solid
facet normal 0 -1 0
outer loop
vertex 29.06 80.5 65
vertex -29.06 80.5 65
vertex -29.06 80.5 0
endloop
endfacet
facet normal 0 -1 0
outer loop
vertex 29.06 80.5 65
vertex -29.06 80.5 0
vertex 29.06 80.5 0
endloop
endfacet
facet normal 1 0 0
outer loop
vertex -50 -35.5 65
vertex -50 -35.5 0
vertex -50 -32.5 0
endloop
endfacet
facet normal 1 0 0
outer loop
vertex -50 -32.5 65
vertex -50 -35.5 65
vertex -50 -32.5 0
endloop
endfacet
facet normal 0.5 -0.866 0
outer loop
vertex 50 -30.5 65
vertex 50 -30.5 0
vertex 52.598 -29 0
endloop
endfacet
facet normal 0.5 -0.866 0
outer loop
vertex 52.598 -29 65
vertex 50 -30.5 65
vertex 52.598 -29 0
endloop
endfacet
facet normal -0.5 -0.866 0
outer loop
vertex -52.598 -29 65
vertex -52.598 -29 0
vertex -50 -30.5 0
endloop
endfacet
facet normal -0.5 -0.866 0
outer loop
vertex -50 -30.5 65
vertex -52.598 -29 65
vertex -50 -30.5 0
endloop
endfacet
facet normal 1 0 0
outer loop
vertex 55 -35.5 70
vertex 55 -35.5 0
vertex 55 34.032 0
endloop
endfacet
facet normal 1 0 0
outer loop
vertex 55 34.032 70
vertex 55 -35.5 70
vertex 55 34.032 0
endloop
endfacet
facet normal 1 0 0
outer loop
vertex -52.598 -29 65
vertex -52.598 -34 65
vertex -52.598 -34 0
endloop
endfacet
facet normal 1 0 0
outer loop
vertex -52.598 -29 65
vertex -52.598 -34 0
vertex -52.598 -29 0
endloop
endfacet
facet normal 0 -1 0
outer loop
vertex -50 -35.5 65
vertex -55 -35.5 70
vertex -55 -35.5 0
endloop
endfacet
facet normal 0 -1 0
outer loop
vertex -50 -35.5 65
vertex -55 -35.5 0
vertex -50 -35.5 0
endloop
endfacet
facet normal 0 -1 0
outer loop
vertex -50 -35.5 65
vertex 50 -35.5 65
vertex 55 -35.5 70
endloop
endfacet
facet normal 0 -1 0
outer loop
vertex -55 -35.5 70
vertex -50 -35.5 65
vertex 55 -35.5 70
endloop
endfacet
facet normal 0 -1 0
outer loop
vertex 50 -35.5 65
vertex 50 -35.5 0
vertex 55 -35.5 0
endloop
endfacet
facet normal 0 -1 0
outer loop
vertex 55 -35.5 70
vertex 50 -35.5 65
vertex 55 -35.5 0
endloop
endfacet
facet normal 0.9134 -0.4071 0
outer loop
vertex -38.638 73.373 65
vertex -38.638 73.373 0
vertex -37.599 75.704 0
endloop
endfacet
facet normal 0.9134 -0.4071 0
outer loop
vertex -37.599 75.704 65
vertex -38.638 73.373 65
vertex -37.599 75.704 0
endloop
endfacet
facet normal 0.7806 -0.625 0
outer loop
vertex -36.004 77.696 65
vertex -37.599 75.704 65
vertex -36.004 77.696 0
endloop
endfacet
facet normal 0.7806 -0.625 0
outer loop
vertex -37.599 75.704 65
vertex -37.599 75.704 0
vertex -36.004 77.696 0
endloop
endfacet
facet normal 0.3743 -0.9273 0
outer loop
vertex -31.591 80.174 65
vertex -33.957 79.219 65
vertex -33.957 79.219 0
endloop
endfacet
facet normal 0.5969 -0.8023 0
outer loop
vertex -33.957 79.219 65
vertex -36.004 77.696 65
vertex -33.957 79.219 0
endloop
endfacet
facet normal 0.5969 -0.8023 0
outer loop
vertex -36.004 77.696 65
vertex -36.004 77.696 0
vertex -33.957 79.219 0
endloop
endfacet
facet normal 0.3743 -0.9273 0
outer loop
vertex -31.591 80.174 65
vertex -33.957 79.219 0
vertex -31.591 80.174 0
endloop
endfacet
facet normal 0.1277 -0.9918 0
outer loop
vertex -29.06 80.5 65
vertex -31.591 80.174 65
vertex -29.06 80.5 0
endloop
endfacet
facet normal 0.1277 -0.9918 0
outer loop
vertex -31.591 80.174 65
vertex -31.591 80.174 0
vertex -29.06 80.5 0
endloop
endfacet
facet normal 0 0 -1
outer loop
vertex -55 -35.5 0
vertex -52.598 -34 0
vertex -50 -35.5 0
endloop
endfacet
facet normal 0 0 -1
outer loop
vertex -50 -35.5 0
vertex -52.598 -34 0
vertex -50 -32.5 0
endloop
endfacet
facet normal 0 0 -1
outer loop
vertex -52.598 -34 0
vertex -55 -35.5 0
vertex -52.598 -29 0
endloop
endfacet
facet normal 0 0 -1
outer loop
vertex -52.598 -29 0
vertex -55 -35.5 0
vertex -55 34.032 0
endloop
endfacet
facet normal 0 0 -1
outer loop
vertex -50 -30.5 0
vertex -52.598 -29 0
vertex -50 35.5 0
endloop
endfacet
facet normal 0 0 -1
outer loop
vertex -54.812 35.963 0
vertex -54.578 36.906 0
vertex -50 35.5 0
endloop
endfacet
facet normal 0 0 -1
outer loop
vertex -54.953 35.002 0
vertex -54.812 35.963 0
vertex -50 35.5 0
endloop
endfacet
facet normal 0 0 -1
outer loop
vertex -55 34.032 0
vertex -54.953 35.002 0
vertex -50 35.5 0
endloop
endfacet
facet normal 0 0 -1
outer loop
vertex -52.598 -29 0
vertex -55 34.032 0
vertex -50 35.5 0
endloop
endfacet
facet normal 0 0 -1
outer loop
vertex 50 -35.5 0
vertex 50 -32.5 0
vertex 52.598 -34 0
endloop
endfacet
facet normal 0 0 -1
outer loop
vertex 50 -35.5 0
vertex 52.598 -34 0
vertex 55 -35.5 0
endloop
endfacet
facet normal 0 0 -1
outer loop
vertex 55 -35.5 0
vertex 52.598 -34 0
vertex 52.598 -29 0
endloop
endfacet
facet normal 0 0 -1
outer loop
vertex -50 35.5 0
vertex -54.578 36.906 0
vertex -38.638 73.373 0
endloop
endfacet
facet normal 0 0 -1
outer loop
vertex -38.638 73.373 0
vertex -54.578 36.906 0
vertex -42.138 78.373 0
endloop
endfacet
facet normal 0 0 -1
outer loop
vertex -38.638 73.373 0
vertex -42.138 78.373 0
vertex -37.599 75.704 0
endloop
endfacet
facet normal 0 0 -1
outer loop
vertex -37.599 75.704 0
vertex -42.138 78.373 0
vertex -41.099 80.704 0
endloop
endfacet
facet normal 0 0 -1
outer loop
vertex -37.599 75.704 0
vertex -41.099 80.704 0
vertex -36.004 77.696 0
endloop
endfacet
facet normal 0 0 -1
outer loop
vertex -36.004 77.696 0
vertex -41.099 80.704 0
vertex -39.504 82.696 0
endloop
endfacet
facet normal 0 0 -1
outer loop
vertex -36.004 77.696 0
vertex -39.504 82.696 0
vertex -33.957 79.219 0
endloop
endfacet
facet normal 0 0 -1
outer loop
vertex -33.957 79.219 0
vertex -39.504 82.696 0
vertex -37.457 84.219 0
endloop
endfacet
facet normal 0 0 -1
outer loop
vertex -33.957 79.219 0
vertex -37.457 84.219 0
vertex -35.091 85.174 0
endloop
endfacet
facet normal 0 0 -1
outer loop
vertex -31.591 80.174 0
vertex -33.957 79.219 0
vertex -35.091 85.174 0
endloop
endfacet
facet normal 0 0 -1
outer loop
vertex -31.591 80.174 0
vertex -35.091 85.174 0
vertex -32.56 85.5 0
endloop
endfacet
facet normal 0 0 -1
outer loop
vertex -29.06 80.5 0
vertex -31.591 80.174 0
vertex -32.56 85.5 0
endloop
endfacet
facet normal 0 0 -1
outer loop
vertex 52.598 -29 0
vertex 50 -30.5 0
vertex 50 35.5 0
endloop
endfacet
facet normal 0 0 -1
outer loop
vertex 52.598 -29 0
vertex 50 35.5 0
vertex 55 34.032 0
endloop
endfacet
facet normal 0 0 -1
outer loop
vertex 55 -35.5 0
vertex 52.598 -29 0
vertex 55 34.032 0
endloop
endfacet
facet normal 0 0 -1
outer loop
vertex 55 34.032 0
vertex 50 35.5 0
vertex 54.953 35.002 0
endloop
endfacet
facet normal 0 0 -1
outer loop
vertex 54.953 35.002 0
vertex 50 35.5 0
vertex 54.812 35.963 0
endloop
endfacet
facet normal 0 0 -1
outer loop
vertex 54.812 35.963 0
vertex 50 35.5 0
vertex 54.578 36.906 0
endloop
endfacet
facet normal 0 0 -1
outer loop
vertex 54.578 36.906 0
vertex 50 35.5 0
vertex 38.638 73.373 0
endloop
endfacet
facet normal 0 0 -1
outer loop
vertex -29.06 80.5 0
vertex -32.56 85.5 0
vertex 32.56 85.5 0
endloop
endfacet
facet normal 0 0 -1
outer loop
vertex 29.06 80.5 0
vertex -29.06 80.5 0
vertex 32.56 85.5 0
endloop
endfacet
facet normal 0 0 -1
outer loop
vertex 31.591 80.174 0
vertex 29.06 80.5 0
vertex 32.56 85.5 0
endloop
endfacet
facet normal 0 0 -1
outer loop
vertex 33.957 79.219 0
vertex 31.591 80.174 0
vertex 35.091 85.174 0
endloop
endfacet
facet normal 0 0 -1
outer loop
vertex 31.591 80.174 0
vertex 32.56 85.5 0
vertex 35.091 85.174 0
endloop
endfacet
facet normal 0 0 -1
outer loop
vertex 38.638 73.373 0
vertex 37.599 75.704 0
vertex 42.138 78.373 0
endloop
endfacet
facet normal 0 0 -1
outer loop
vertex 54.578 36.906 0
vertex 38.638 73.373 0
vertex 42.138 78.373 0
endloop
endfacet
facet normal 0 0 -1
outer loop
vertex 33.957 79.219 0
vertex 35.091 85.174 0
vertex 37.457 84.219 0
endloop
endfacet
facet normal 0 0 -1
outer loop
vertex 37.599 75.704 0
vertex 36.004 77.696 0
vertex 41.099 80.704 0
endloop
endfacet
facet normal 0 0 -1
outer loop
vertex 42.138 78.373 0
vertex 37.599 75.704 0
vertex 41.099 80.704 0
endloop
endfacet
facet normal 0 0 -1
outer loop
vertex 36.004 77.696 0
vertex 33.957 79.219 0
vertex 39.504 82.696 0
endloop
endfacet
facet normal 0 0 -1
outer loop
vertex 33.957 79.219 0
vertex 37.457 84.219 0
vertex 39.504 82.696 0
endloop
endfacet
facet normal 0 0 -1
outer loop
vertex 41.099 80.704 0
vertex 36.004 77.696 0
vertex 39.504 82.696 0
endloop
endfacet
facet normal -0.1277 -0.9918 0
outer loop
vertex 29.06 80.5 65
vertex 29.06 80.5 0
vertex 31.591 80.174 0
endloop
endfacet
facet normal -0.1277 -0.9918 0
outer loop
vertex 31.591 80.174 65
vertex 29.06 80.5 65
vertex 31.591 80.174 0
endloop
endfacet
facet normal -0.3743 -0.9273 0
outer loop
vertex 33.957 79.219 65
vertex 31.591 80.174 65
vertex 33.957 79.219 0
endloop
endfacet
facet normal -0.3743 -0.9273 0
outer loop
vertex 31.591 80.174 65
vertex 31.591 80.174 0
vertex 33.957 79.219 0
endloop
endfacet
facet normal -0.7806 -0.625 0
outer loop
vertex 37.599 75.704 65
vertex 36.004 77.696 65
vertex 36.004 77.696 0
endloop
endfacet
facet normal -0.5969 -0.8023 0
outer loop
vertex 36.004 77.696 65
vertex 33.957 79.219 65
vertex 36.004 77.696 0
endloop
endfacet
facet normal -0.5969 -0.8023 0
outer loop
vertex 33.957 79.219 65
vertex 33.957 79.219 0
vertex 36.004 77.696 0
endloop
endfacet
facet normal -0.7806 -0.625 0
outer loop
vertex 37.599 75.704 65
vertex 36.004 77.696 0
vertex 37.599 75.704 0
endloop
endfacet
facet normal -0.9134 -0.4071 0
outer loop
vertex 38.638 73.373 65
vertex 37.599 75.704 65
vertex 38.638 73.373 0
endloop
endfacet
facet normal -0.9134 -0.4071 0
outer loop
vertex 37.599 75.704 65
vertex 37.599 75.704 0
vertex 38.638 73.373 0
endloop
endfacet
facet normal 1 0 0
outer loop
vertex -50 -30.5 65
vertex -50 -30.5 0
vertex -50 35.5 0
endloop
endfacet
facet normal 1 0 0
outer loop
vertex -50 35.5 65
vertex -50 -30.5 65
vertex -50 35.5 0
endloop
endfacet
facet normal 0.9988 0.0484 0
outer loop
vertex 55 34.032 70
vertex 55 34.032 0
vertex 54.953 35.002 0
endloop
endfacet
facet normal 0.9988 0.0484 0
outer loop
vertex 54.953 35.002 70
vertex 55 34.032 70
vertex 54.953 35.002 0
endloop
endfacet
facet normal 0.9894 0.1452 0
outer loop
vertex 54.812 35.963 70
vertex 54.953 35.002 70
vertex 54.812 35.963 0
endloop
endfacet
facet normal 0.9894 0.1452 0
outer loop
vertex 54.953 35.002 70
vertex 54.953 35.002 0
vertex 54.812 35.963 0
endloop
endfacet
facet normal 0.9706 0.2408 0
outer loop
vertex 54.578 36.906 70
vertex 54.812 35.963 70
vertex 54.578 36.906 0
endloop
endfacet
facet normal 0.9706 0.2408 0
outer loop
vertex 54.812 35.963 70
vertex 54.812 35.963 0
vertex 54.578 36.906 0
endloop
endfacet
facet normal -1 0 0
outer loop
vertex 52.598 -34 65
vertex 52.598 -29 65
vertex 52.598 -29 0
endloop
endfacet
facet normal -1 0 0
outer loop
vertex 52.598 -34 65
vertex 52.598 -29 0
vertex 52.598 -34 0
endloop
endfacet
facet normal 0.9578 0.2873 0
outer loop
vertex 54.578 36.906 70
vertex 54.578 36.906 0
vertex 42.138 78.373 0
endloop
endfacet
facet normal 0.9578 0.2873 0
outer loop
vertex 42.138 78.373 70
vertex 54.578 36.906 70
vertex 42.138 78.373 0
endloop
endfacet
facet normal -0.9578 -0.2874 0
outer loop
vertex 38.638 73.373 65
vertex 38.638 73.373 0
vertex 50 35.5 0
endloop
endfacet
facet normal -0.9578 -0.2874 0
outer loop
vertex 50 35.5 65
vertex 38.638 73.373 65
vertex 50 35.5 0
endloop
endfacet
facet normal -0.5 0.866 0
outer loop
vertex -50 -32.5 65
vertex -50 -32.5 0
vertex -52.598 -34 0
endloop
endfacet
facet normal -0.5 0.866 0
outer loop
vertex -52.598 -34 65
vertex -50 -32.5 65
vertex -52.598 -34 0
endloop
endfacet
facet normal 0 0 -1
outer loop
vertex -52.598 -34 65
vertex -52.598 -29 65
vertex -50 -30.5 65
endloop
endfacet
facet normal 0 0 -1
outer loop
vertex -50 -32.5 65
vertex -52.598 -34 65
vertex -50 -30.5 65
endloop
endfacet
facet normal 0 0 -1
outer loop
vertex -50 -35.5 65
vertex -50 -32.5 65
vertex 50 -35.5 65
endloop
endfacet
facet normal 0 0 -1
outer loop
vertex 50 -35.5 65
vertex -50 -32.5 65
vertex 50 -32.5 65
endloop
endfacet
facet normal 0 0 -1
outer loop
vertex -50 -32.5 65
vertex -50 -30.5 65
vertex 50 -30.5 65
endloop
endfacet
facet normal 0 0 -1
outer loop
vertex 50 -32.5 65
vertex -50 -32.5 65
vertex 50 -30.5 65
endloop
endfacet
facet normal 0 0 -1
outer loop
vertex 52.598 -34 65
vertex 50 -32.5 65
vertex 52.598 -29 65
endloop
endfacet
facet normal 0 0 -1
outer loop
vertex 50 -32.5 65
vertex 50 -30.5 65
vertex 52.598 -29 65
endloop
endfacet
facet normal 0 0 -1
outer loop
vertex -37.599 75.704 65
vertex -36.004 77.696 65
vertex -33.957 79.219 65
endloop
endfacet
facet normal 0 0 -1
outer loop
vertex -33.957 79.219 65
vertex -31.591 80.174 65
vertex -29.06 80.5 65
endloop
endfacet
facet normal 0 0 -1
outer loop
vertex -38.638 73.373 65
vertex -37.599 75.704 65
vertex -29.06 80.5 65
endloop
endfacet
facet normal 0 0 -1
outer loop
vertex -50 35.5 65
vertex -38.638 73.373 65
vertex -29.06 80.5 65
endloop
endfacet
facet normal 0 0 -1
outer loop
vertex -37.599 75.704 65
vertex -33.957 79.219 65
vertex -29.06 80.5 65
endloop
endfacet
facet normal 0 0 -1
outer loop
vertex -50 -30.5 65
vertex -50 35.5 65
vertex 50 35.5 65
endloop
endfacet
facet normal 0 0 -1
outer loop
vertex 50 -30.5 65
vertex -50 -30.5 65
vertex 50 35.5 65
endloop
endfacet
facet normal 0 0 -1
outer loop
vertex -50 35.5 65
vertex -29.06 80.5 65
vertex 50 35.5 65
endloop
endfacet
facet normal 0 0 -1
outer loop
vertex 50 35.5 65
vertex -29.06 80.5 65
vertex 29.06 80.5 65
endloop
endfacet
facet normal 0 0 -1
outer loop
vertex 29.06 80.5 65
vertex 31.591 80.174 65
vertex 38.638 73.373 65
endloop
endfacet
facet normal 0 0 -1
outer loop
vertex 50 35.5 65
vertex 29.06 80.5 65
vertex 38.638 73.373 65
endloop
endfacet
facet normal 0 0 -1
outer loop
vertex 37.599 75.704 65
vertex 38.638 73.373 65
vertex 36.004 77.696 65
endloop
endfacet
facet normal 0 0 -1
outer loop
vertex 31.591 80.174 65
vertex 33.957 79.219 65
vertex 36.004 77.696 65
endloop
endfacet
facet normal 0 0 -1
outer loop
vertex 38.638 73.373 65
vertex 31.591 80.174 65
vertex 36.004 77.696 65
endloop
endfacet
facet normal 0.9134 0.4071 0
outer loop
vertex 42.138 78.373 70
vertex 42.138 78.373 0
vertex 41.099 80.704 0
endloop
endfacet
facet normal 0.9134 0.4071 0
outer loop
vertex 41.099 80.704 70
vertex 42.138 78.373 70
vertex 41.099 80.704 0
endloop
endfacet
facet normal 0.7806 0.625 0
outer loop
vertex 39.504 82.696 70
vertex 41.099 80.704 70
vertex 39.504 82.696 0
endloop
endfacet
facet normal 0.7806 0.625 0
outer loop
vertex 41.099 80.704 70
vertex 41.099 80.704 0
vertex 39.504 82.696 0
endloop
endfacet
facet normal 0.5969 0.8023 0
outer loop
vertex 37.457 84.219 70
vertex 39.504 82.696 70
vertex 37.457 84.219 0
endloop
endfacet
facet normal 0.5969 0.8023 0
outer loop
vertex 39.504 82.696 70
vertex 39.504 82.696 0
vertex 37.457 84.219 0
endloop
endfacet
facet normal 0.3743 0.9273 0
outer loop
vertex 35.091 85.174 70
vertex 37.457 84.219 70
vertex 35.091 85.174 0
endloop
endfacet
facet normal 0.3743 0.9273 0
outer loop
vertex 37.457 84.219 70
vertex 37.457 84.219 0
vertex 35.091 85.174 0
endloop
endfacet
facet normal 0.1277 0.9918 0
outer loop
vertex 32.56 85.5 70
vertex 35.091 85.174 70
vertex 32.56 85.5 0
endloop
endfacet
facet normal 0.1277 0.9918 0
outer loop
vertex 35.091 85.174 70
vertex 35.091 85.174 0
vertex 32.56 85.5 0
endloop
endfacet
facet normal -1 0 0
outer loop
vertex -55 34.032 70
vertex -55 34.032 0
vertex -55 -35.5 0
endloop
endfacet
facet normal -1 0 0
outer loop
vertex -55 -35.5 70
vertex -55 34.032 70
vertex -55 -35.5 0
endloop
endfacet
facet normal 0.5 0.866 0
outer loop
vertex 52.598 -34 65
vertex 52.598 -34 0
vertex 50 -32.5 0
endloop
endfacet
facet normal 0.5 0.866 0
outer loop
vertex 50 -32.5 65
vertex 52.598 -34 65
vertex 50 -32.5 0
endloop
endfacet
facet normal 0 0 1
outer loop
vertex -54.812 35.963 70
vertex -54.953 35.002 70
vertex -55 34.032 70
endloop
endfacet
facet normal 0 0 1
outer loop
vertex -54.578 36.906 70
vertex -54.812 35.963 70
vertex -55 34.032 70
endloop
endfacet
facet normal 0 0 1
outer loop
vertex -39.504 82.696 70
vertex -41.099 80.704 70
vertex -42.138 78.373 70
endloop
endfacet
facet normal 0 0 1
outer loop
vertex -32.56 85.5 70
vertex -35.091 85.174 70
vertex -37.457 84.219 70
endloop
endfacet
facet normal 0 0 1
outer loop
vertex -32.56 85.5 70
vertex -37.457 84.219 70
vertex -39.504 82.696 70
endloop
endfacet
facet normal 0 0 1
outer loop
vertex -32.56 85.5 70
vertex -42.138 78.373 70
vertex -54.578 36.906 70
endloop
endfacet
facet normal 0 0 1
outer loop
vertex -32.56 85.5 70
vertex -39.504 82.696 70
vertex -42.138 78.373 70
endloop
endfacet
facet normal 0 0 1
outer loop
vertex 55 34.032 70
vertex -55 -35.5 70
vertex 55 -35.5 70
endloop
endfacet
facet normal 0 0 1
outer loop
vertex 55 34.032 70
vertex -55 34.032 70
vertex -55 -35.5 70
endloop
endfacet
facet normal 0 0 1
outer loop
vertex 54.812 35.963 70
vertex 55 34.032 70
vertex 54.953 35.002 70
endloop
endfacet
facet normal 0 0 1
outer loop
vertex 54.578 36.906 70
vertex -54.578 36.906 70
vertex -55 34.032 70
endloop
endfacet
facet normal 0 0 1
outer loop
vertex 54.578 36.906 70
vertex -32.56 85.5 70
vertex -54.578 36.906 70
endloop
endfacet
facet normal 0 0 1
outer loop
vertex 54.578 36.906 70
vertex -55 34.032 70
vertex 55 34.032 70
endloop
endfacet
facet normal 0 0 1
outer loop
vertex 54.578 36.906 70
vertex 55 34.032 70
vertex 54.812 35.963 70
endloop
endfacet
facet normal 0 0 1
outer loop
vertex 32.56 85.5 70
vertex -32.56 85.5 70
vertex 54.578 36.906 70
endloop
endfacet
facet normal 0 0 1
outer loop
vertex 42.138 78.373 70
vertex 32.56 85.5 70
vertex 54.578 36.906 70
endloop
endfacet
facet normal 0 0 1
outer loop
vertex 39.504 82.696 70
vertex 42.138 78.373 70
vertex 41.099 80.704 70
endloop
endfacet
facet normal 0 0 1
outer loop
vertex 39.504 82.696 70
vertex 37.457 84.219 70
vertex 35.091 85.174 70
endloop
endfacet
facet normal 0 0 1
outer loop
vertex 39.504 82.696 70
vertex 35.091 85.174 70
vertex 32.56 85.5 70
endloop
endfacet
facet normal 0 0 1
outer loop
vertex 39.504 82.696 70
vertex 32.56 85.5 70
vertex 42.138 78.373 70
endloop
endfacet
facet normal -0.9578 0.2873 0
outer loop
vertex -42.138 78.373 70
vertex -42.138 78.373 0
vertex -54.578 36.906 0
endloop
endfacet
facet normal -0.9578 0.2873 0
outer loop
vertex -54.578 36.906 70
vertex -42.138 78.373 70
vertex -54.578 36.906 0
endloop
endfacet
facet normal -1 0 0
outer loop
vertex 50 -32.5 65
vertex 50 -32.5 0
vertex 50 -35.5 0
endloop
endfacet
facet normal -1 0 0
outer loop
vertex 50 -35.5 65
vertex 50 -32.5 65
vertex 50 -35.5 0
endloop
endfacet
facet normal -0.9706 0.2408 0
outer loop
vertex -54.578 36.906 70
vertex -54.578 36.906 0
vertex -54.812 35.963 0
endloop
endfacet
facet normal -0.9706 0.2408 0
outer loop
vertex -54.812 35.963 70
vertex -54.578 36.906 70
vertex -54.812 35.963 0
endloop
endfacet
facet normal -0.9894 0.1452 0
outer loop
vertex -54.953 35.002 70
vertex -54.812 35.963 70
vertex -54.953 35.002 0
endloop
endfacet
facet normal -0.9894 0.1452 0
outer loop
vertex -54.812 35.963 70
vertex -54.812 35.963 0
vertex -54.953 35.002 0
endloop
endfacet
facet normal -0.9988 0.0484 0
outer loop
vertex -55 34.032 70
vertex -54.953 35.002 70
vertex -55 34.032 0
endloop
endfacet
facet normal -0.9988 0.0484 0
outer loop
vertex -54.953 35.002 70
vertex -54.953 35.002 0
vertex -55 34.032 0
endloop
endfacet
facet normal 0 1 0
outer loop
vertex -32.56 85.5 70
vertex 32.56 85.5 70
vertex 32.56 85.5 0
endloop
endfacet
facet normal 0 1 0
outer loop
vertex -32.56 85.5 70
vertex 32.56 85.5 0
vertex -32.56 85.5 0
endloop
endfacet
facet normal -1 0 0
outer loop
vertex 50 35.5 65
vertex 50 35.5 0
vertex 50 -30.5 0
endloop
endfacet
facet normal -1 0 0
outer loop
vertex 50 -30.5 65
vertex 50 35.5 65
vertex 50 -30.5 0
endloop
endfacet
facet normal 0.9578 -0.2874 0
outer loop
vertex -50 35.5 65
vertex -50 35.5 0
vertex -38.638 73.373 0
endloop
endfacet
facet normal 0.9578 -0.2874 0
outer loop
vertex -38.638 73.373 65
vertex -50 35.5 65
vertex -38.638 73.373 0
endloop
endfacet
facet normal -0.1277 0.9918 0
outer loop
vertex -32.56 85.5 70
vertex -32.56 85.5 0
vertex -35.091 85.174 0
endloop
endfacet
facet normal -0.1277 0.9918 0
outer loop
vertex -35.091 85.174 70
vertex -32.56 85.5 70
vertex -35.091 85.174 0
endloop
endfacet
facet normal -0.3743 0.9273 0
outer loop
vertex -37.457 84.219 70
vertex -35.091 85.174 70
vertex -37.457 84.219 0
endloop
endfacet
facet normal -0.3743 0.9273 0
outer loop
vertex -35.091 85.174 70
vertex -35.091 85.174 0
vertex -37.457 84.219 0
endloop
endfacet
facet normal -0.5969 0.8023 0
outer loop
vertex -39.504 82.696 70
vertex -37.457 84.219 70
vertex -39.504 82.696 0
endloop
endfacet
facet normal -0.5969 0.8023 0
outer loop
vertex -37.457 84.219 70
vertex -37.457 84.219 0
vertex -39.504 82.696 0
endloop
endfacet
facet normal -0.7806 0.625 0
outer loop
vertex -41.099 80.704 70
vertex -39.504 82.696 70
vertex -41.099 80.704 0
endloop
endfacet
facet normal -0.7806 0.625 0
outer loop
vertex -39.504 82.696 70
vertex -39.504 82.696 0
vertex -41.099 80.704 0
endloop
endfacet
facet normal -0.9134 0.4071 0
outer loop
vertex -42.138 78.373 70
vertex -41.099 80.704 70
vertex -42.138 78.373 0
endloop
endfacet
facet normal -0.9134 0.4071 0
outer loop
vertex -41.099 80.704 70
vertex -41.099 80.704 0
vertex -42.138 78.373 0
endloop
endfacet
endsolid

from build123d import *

# Parameters (mm, degrees)
EXTRUDE_4_DEPTH = 70
EXTRUDE_START   = -5
EXTRUDE_5_DEPTH = 5


with BuildPart() as part:
    # 草图1 → 凸台-拉伸4 (new body)
    with BuildSketch(Plane.XY):
        with BuildLine():
            Line((-52.598076211, -29), (-50, -30.5))
            Line((-50, -30.5), (-50, 35.5))
            Line((-50, 35.5), (-38.637956343, 73.373478856))
            ThreePointArc((-38.637956343, 73.373478856), (-35.028998787, 78.522929283), (-29.059693491, 80.5))
            Line((-29.059693491, 80.5), (0, 80.5))
            Line((0, 80.5), (29.059693491, 80.5))
            ThreePointArc((29.059693491, 80.5), (35.028998787, 78.522929283), (38.637956343, 73.373478856))
            Line((38.637956343, 73.373478856), (50, 35.5))
            Line((50, 35.5), (50, -30.5))
            Line((50, -30.5), (52.598076211, -29))
            Line((52.598076211, -29), (52.598076211, -34))
            Line((52.598076211, -34), (50, -32.5))
            Line((50, -32.5), (50, -35.5))
            Line((50, -35.5), (55, -35.5))
            Line((55, -35.5), (55, 34.032311637))
            ThreePointArc((55, 34.032311637), (54.894003955, 35.484443084), (54.578262852, 36.905790493))
            Line((54.578262852, 36.905790493), (42.137956343, 78.373478856))
            ThreePointArc((42.137956343, 78.373478856), (38.528998787, 83.522929283), (32.559693491, 85.5))
            Line((32.559693491, 85.5), (0, 85.5))
            Line((0, 85.5), (-32.559693491, 85.5))
            ThreePointArc((-32.559693491, 85.5), (-38.528998787, 83.522929283), (-42.137956343, 78.373478856))
            Line((-42.137956343, 78.373478856), (-54.578262852, 36.905790493))
            ThreePointArc((-54.578262852, 36.905790493), (-54.894003955, 35.484443084), (-55, 34.032311637))
            Line((-55, 34.032311637), (-55, -35.5))
            Line((-55, -35.5), (-50, -35.5))
            Line((-50, -35.5), (-50, -32.5))
            Line((-50, -32.5), (-52.598076211, -34))
            Line((-52.598076211, -34), (-52.598076211, -29))
        make_face()
    extrude(amount=EXTRUDE_4_DEPTH)

    # 草图2 → 凸台-拉伸5 (add)
    with BuildSketch(Plane.XY.offset(70).offset(EXTRUDE_START)):
        with BuildLine():
            Line((-50, -35.5), (50, -35.5))
            Line((50, -35.5), (50, -32.5))
            Line((50, -32.5), (52.598076211, -34))
            Line((52.598076211, -34), (52.598076211, -29))
            Line((52.598076211, -29), (50, -30.5))
            Line((50, -30.5), (50, 35.5))
            Line((50, 35.5), (38.637956343, 73.373478856))
            ThreePointArc((38.637956343, 73.373478856), (35.028998787, 78.522929283), (29.059693491, 80.5))
            Line((29.059693491, 80.5), (-29.059693491, 80.5))
            ThreePointArc((-29.059693491, 80.5), (-35.028998787, 78.522929283), (-38.637956343, 73.373478856))
            Line((-38.637956343, 73.373478856), (-50, 35.5))
            Line((-50, 35.5), (-50, -30.5))
            Line((-50, -30.5), (-52.598076211, -29))
            Line((-52.598076211, -29), (-52.598076211, -34))
            Line((-52.598076211, -34), (-50, -32.5))
            Line((-50, -32.5), (-50, -35.5))
        make_face()
    extrude(amount=EXTRUDE_5_DEPTH)


solid = part.part
